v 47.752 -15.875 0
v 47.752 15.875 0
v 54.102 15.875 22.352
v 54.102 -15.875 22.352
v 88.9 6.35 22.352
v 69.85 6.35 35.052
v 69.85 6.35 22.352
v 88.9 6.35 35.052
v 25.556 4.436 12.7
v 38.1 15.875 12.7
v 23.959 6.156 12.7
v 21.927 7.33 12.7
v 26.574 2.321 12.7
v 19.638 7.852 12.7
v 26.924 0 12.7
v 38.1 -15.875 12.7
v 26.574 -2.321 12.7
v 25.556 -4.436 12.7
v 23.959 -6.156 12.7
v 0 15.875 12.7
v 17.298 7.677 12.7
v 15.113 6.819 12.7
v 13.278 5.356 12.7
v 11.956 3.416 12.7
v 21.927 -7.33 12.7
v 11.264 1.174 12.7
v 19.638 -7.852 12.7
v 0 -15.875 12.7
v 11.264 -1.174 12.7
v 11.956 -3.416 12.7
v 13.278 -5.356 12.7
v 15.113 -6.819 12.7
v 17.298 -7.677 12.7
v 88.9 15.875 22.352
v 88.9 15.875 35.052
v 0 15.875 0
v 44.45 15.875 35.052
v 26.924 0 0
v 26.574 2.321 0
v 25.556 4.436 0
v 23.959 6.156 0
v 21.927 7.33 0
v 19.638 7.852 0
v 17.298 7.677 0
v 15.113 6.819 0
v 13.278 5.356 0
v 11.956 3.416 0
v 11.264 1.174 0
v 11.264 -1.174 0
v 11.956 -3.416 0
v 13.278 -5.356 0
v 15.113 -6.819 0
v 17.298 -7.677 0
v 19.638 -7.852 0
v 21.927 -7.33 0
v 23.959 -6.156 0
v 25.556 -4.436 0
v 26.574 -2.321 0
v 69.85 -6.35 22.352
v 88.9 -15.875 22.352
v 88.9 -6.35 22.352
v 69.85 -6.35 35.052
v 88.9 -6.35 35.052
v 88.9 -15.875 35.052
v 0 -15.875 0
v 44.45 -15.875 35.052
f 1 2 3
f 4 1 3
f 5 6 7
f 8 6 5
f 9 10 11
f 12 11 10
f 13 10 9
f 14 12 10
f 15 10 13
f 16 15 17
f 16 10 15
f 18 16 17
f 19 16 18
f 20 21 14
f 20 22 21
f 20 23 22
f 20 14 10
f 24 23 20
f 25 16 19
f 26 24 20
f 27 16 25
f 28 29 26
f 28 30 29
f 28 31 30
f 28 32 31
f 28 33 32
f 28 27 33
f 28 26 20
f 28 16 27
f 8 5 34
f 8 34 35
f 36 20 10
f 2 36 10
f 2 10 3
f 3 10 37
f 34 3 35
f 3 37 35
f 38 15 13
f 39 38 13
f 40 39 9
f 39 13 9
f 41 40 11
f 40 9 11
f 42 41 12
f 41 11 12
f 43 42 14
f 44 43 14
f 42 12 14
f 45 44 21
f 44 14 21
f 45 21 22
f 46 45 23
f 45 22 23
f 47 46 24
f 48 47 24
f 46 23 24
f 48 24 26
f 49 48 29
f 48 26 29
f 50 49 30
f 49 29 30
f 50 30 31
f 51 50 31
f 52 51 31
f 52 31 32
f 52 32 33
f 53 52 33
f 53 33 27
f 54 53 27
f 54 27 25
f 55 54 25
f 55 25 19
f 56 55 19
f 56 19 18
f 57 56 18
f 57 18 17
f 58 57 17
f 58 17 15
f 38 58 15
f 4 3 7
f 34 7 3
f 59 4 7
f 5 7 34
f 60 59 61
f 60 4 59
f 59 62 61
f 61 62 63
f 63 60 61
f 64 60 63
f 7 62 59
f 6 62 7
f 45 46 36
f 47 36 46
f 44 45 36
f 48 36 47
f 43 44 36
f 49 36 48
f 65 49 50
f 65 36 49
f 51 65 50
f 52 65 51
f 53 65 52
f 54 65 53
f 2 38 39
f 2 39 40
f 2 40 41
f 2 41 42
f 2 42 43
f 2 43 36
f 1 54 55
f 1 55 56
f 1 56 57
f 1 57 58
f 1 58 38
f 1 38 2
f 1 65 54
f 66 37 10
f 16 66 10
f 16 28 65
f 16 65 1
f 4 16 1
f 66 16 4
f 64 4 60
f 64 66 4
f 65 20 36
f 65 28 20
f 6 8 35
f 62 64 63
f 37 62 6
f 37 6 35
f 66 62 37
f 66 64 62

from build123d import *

# Parameters (mm, degrees)
F1_DEPTH = 15.875
F2_W     = 19.05
F2_H     = 12.7
F3_DEPTH = 25.4
F4_R     = 7.874
F5_DEPTH = 25.4


with BuildPart() as f1:
    # F0 (on Front) → F1 (new body, symmetric)
    with BuildSketch(Plane.XZ):
        Polygon((0, 12.7), (0, 0), (47.752, 0), (54.102, 22.352), (88.9, 22.352), (88.9, 35.052), (44.45, 35.052), (38.1, 12.7), align=None)
    extrude(amount=F1_DEPTH, both=True)

    # F2 (on face) → F3 (cut)
    with BuildSketch(Plane.XY.offset(35.052)):
        with Locations((79.375, 0)):
            Rectangle(F2_W, F2_H)
    extrude(amount=-F3_DEPTH, mode=Mode.SUBTRACT)

    # F4 (on face) → F5 (cut)
    with BuildSketch(Plane.XY.offset(12.7)):
        with Locations((19.05, 0)):
            Circle(F4_R)
    extrude(amount=-F5_DEPTH, mode=Mode.SUBTRACT)


solid = f1.part
